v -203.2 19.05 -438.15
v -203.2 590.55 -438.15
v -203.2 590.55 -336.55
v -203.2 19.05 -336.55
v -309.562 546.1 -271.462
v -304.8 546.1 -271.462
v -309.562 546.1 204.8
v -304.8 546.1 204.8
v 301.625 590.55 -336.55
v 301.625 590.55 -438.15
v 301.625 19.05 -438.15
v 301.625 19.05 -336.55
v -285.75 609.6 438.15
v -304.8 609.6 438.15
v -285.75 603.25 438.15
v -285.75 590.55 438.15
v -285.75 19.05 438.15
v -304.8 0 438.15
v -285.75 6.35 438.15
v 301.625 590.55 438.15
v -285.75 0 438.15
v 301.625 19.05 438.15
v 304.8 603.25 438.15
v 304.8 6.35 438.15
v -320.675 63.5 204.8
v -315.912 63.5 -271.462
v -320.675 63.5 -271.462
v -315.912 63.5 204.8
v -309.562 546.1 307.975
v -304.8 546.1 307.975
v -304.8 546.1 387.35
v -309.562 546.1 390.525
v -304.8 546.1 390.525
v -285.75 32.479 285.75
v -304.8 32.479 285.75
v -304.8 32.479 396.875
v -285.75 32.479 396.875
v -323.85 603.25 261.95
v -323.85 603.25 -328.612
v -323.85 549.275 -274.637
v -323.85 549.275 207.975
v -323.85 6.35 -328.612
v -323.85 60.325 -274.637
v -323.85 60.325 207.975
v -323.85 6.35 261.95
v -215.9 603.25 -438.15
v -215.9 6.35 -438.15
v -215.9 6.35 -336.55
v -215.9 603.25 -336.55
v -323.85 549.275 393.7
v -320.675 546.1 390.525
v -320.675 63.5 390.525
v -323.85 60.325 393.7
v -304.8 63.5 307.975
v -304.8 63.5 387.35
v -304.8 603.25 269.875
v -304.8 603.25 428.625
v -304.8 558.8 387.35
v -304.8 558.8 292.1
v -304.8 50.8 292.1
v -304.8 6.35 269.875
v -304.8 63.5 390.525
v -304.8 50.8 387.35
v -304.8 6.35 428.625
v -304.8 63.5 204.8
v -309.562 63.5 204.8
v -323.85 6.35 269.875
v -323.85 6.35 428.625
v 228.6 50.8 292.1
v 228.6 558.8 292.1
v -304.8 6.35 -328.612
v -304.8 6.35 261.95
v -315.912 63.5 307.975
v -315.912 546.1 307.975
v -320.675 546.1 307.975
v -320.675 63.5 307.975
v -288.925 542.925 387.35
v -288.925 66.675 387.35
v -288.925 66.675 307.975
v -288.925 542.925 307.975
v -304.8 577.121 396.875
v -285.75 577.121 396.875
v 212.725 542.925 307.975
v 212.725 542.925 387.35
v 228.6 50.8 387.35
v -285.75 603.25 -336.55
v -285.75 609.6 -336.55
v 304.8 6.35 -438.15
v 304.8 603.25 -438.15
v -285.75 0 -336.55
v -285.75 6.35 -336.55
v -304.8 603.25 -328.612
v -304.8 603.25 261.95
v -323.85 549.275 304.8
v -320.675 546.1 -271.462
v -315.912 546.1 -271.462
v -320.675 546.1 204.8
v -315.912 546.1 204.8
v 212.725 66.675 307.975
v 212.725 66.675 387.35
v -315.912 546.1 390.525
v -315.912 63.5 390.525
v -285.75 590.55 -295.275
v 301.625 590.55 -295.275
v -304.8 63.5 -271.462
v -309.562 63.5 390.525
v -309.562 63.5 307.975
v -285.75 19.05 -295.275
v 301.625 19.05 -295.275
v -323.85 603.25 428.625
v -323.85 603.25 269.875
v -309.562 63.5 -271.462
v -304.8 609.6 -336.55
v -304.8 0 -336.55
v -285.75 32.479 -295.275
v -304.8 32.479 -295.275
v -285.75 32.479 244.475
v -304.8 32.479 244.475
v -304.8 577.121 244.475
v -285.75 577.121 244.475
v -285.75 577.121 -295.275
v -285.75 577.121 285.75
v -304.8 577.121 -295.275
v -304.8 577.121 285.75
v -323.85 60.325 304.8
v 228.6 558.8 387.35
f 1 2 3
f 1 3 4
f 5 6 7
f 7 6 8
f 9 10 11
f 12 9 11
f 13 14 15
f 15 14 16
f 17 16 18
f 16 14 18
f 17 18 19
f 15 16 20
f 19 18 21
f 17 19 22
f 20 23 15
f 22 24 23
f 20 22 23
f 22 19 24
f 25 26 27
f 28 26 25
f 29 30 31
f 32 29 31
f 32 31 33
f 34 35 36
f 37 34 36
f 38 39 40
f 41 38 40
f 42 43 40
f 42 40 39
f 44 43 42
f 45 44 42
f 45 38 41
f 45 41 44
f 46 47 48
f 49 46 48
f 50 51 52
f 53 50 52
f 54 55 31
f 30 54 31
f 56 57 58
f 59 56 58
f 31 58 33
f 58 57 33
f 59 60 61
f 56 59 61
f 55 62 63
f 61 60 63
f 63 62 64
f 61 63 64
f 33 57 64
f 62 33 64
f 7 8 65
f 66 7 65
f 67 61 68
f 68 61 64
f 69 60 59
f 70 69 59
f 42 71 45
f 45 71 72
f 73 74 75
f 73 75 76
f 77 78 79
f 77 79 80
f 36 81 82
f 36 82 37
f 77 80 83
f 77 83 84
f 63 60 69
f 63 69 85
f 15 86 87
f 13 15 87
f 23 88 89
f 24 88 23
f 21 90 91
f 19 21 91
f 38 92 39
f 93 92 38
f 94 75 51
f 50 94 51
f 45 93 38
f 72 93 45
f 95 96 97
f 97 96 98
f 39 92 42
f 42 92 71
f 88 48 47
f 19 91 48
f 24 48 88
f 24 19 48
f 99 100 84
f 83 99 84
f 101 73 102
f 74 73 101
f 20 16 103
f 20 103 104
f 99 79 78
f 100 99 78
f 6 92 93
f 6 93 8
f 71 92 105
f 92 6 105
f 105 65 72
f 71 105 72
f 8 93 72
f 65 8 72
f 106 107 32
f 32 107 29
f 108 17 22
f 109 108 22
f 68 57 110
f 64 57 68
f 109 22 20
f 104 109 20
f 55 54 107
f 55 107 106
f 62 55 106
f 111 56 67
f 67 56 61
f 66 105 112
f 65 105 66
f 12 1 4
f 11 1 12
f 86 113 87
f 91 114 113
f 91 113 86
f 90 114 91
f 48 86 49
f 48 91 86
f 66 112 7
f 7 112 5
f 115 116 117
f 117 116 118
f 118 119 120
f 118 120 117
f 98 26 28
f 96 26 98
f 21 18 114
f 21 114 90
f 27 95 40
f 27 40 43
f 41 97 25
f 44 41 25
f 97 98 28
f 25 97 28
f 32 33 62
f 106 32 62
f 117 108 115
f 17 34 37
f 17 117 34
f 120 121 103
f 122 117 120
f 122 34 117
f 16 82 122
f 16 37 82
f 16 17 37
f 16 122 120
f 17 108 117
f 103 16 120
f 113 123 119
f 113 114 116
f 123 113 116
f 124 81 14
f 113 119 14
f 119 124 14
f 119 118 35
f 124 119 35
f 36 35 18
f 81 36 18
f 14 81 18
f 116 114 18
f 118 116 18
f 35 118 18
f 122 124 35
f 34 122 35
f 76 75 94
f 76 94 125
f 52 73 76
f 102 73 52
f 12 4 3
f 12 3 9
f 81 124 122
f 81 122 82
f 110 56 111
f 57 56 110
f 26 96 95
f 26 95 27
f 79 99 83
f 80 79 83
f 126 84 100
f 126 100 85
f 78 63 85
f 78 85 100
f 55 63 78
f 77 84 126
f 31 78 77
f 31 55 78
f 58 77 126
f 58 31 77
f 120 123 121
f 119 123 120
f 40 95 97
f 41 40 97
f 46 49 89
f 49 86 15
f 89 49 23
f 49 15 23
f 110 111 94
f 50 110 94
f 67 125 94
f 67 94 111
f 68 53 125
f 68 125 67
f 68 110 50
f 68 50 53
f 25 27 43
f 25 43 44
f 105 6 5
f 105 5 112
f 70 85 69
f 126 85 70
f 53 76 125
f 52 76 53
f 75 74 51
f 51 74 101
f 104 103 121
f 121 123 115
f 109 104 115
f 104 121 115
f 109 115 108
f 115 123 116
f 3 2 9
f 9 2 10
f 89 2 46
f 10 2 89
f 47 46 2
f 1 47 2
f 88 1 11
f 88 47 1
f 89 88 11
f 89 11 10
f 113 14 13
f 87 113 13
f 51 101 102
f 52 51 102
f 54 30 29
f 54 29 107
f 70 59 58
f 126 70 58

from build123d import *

# Parameters (mm, degrees)
F0_W          = 609.6
F0_H          = 876.3
F1_DEPTH      = 609.6
F2_W          = 88.9
F2_H          = 101.6
F3_DEPTH      = 609.601
F4_W          = 544.6426229508
F4_H          = 692.15
F5_DEPTH      = 19.05
F6_W          = 590.55
F6_H          = 6.35
F7_DEPTH      = 876.301
F8_W          = 587.375
F8_H          = 571.5
F9_DEPTH      = 733.425
F10_W         = 544.6426229508
F10_H         = 41.275
F11_DEPTH     = 19.05
F12_W         = 596.9
F12_H         = 590.5627
F12_W_2       = 482.6
F12_H_2       = 476.2627
F13_DEPTH     = 19.05
F14_W         = 6.35
F14_H         = 482.6
F15_DEPTH     = 476.2627
F16_SIZE      = 3.175
F17_W         = 596.9
F17_H         = 158.75
F17_W_2       = 482.6
F17_H_2       = 82.55
F18_DEPTH     = 19.05
F19_W         = 6.35
F19_H         = 482.6
F20_DEPTH     = 82.55
F21_SIZE      = 3.175
F22_W         = 504.825
F22_H         = 571.5
F23_DEPTH     = 101.6
F24_W         = 508
F24_H         = 95.25
F25_DEPTH     = 533.4
F26_T         = 15.875
F26_T3_DEPTH  = 37.249261314
F26_T5_DEPTH  = 37.249261314
F26_T7_DEPTH  = 37.249261314
F26_T9_DEPTH  = 37.249261314
F26_T11_DEPTH = 36.5125
F26_T13_DEPTH = 514.35
F26_T15_DEPTH = 114.3
F26_T17_DEPTH = 127
F26_T19_DEPTH = 539.75
F26_T21_DEPTH = 111.125
F26_T23_DEPTH = 36.5125


# Not quite as in the source:
# - a shell that OpenCascade refuses in one call is made with other operations: the cavity is built on its own and cut out


with BuildPart() as f1:
    # F0 (on Front) → F1 (new body)
    with BuildSketch(Plane.XZ):
        Rectangle(F0_W, F0_H)
    extrude(amount=-F1_DEPTH)

    # F2 (on face) → F3 (cut, through all)
    with BuildSketch(Plane.XZ):
        with Locations((-260.35, -387.35)):
            Rectangle(F2_W, F2_H)
    extrude(amount=-F3_DEPTH, mode=Mode.SUBTRACT)

    # F4 (on face) → F5 (cut)
    with BuildSketch(Plane(origin=(-304.8, 0, 0), x_dir=(0, -1, 0), z_dir=(-1, 0, 0))):
        with Locations((-304.8, 50.8)):
            Rectangle(F4_W, F4_H)
    extrude(amount=-F5_DEPTH, mode=Mode.SUBTRACT)

    # F6 (on face) → F7 (cut, through all)
    with BuildSketch(Plane.XY.offset(438.15)):
        with Locations((9.525, 606.425)):
            Rectangle(F6_W, F6_H)
        with Locations((9.525, 3.175)):
            Rectangle(F6_W, F6_H)
    extrude(amount=-F7_DEPTH, mode=Mode.SUBTRACT)

    # F8 (on face) → F9 (cut, through all)
    with BuildSketch(Plane.XY.offset(438.15)):
        with Locations((7.9375, 304.8)):
            Rectangle(F8_W, F8_H)
    extrude(amount=-F9_DEPTH, mode=Mode.SUBTRACT)

    # F10 (on face) → F11 (join, through all)
    with BuildSketch(Plane(origin=(-304.8, 0, 0), x_dir=(0, -1, 0), z_dir=(-1, 0, 0))):
        with Locations((-304.8, 265.1125)):
            Rectangle(F10_W, F10_H)
    extrude(amount=-F11_DEPTH)

    # F22 (on face) → F23 (cut)
    with BuildSketch(Plane(origin=(0, 0, -438.15), x_dir=(1, 0, 0), z_dir=(0, 0, -1))):
        with Locations((49.2125, -304.8)):
            Rectangle(F22_W, F22_H)
    extrude(amount=-F23_DEPTH, mode=Mode.SUBTRACT)


with BuildPart() as f13:
    # F12 (on face) → F13 (new body)
    with BuildSketch(Plane(origin=(-304.8, 0, 0), x_dir=(0, -1, 0), z_dir=(-1, 0, 0))):
        with Locations((-304.8, -33.33115)):
            Rectangle(F12_W, F12_H)
        with Locations((-304.8, -33.33115)):
            Rectangle(F12_W_2, F12_H_2, mode=Mode.SUBTRACT)
    extrude(amount=F13_DEPTH)

    # F14 (on face) → F15 (join, through all)
    with BuildSketch(Plane.XY.offset(-271.4625)):
        with Locations((-312.7375, 304.8)):
            Rectangle(F14_W, F14_H)
    extrude(amount=F15_DEPTH)

    # F16
    f16_edges = [f13.edges().sort_by_distance(p)[0] for p in [
        (-323.85, 546.1, -33.33115),
        (-323.85, 304.8, -271.4625),
        (-323.85, 63.5, -33.33115),
        (-323.85, 304.8, 204.8002),
    ]]
    chamfer(f16_edges, length=F16_SIZE)


with BuildPart() as f18:
    # F17 (on face) → F18 (new body)
    with BuildSketch(Plane(origin=(-304.8, 0, 0), x_dir=(0, -1, 0), z_dir=(-1, 0, 0))):
        with Locations((-304.8, 349.25)):
            Rectangle(F17_W, F17_H)
        with Locations((-304.8, 349.25)):
            Rectangle(F17_W_2, F17_H_2, mode=Mode.SUBTRACT)
    extrude(amount=F18_DEPTH)

    # F19 (on face) → F20 (join, through all)
    with BuildSketch(Plane.XY.offset(307.975)):
        with Locations((-312.7375, 304.8)):
            Rectangle(F19_W, F19_H)
    extrude(amount=F20_DEPTH)

    # F21
    f21_edges = [f18.edges().sort_by_distance(p)[0] for p in [
        (-323.85, 304.8, 307.975),
        (-323.85, 546.1, 349.25),
        (-323.85, 304.8, 390.525),
        (-323.85, 63.5, 349.25),
    ]]
    chamfer(f21_edges, length=F21_SIZE)

    # F24 (on face) → F25 (join)
    with BuildSketch(Plane.YZ.offset(-304.8)):
        with Locations((304.8, 339.725)):
            Rectangle(F24_W, F24_H)
    extrude(amount=F25_DEPTH)

    # F26: shell of thickness 15.875, made by hand


with BuildPart() as f26_core1:
    # F26_t2: copy of F18
    add(f18.part)

    # the walls: a layer under each face that stays
    f26_faces = [f26_core1.faces().sort_by_distance(p)[0] for p in [
        (-323.85, 503.7666666667, 296.3333333333),
        (-322.2625, 304.8, 306.3875),
        (-322.2625, 61.9125, 349.25),
        (-322.2625, 547.6875, 349.25),
        (-322.2625, 304.8, 392.1125),
        (-314.325, 304.8, 428.625),
        (-314.325, 603.25, 349.25),
        (-314.325, 304.8, 269.875),
        (-314.325, 6.35, 349.25),
        (-318.29375, 304.8, 307.975),
        (-318.29375, 63.5, 349.25),
        (-318.29375, 546.1, 349.25),
        (-318.29375, 304.8, 390.525),
        (-304.8, 503.7666666667, 402.1666666667),
        (-315.9125, 304.8, 349.25),
        (-38.1, 558.8, 339.725),
        (-38.1, 304.8, 292.1),
        (-38.1, 50.8, 339.725),
        (-307.18125, 63.5, 349.25),
        (-307.18125, 304.8, 390.525),
        (-307.18125, 546.1, 349.25),
        (-304.8, 304.8, 347.6625),
        (228.6, 304.8, 339.725),
        (-307.18125, 304.8, 307.975),
        (-309.5625, 304.8, 349.25),
    ]]
    thicken(f26_faces, amount=-F26_T, mode=Mode.SUBTRACT)

    # F26_s4 → F26_t3 (cut)
    with BuildSketch(Plane(origin=(4.5928978099, 4.5928978099, 4.5928978099), x_dir=(-0.7071067812, 0.7071067812, 0), z_dir=(0.5773502692, 0.5773502692, 0.5773502692))):
        Polygon((271.8908726623, 356.5892701441), (263.7152476623, 342.7036353262), (255.7777476623, 347.2863530879), (255.7777476623, 356.4517886113), align=None)
    extrude(amount=F26_T3_DEPTH, mode=Mode.SUBTRACT)

    # F26_s6 → F26_t5 (cut)
    with BuildSketch(Plane(origin=(-198.6071021901, 198.60710219, -198.6071021901), x_dir=(0.7071067812, 0.7071067812, 0), z_dir=(0.5773502692, -0.5773502692, 0.5773502692))):
        Polygon((159.161421149, 605.4574280109), (167.337046149, 591.571793193), (175.274546149, 596.1545109546), (175.274546149, 605.319946478), align=None)
    extrude(amount=F26_T5_DEPTH, mode=Mode.SUBTRACT)

    # F26_s8 → F26_t7 (cut)
    with BuildSketch(Plane(origin=(-228.2404355234, -228.2404355234, 228.2404355234), x_dir=(-0.7071067812, 0.7071067812, 0), z_dir=(0.5773502692, 0.5773502692, -0.5773502692))):
        Polygon((271.8908726623, 213.7335916339), (255.7777476623, 213.8710731668), (255.7777476623, 223.0365086901), (263.7152476623, 227.6192264518), align=None)
    extrude(amount=F26_T7_DEPTH, mode=Mode.SUBTRACT)

    # F26_s10 → F26_t9 (cut)
    with BuildSketch(Plane(origin=(-431.4404355234, 431.4404355234, 431.4404355234), x_dir=(0.7071067812, 0.7071067812, 0), z_dir=(0.5773502692, -0.5773502692, -0.5773502692))):
        Polygon((159.161421149, -35.1345662329), (175.274546149, -34.9970847), (175.274546149, -25.8316491766), (167.337046149, -21.2489314149), align=None)
    extrude(amount=F26_T9_DEPTH, mode=Mode.SUBTRACT)

    # F26_s12 → F26_t11 (cut)
    with BuildSketch(Plane.YZ.offset(-336.55)):
        Polygon((545.94125, 308.13375), (546.1, 292.1), (561.975, 292.1), (561.975, 307.975), align=None)
        Polygon((63.65875, 308.13375), (63.5, 292.1), (47.625, 292.1), (47.625, 307.975), align=None)
        Polygon((63.65875, 390.36625), (47.625, 390.525), (47.625, 406.4), (63.5, 406.4), align=None)
        Polygon((545.94125, 390.36625), (561.975, 390.525), (561.975, 406.4), (546.1, 406.4), align=None)
    extrude(amount=F26_T11_DEPTH, mode=Mode.SUBTRACT)

    # F26_s14 → F26_t13 (cut)
    with BuildSketch(Plane.XZ.offset(-561.975)):
        Polygon((-316.07125, 308.13375), (-315.9125, 292.1), (-300.0375, 292.1), (-300.0375, 307.975), align=None)
        Polygon((-316.07125, 390.36625), (-315.9125, 406.4), (-300.0375, 406.4), (-300.0375, 390.525), align=None)
        Polygon((-309.40375, 390.36625), (-309.5625, 406.4), (-325.4375, 406.4), (-325.4375, 390.525), align=None)
        Polygon((-304.95875, 308.13375), (-288.925, 307.975), (-288.925, 292.1), (-304.8, 292.1), align=None)
        Polygon((-309.40375, 308.13375), (-309.5625, 292.1), (-325.4375, 292.1), (-325.4375, 307.975), align=None)
    extrude(amount=F26_T13_DEPTH, mode=Mode.SUBTRACT)

    # F26_s16 → F26_t15 (cut)
    with BuildSketch(Plane.XY.offset(292.1)):
        Polygon((-316.07125, 63.65875), (-315.9125, 47.625), (-300.0375, 47.625), (-300.0375, 63.5), align=None)
        Polygon((-316.07125, 545.94125), (-315.9125, 561.975), (-300.0375, 561.975), (-300.0375, 546.1), align=None)
        Polygon((-309.40375, 63.65875), (-309.5625, 47.625), (-325.4375, 47.625), (-325.4375, 63.5), align=None)
        Polygon((-309.40375, 545.94125), (-309.5625, 561.975), (-325.4375, 561.975), (-325.4375, 546.1), align=None)
    extrude(amount=F26_T15_DEPTH, mode=Mode.SUBTRACT)

    # F26_s18 → F26_t17 (cut)
    with BuildSketch(Plane.XY.offset(276.225)):
        Polygon((-304.64125, 558.95875), (-320.675, 558.8), (-320.675, 542.925), (-304.8, 542.925), align=None)
        Polygon((-304.64125, 50.64125), (-320.675, 50.8), (-320.675, 66.675), (-304.8, 66.675), align=None)
    extrude(amount=F26_T17_DEPTH, mode=Mode.SUBTRACT)

    # F26_s20 → F26_t19 (cut)
    with BuildSketch(Plane.XZ.offset(-574.675)):
        Polygon((-304.64125, 291.94125), (-320.675, 292.1), (-320.675, 307.975), (-304.8, 307.975), align=None)
    extrude(amount=F26_T19_DEPTH, mode=Mode.SUBTRACT)

    # F26_s22 → F26_t21 (cut)
    with BuildSketch(Plane.XY.offset(292.1)):
        Polygon((-304.95875, 63.65875), (-304.8, 47.625), (-288.925, 47.625), (-288.925, 63.5), align=None)
        Polygon((-304.95875, 545.94125), (-304.8, 561.975), (-288.925, 561.975), (-288.925, 546.1), align=None)
    extrude(amount=F26_T21_DEPTH, mode=Mode.SUBTRACT)

    # F26_s24 → F26_t23 (cut)
    with BuildSketch(Plane.YZ.offset(-325.4375)):
        Polygon((63.65875, 308.13375), (47.625, 307.975), (47.625, 292.1), (63.5, 292.1), align=None)
        Polygon((63.65875, 390.36625), (47.625, 390.525), (47.625, 406.4), (63.5, 406.4), align=None)
        Polygon((545.94125, 390.36625), (546.1, 406.4), (561.975, 406.4), (561.975, 390.525), align=None)
        Polygon((545.94125, 308.13375), (561.975, 307.975), (561.975, 292.1), (546.1, 292.1), align=None)
    extrude(amount=F26_T23_DEPTH, mode=Mode.SUBTRACT)


with BuildPart() as f18_1:
    add(f18.part)

    # what is left inside the walls is the cavity
    f26_cavity = [f26_core1.part.solids().sort_by_distance(p)[0] for p in [
        (45.508333, 304.8, 308.13375),
    ]]
    add(f26_cavity, mode=Mode.SUBTRACT)


solid = Compound([f1.part, f13.part, f18_1.part])
